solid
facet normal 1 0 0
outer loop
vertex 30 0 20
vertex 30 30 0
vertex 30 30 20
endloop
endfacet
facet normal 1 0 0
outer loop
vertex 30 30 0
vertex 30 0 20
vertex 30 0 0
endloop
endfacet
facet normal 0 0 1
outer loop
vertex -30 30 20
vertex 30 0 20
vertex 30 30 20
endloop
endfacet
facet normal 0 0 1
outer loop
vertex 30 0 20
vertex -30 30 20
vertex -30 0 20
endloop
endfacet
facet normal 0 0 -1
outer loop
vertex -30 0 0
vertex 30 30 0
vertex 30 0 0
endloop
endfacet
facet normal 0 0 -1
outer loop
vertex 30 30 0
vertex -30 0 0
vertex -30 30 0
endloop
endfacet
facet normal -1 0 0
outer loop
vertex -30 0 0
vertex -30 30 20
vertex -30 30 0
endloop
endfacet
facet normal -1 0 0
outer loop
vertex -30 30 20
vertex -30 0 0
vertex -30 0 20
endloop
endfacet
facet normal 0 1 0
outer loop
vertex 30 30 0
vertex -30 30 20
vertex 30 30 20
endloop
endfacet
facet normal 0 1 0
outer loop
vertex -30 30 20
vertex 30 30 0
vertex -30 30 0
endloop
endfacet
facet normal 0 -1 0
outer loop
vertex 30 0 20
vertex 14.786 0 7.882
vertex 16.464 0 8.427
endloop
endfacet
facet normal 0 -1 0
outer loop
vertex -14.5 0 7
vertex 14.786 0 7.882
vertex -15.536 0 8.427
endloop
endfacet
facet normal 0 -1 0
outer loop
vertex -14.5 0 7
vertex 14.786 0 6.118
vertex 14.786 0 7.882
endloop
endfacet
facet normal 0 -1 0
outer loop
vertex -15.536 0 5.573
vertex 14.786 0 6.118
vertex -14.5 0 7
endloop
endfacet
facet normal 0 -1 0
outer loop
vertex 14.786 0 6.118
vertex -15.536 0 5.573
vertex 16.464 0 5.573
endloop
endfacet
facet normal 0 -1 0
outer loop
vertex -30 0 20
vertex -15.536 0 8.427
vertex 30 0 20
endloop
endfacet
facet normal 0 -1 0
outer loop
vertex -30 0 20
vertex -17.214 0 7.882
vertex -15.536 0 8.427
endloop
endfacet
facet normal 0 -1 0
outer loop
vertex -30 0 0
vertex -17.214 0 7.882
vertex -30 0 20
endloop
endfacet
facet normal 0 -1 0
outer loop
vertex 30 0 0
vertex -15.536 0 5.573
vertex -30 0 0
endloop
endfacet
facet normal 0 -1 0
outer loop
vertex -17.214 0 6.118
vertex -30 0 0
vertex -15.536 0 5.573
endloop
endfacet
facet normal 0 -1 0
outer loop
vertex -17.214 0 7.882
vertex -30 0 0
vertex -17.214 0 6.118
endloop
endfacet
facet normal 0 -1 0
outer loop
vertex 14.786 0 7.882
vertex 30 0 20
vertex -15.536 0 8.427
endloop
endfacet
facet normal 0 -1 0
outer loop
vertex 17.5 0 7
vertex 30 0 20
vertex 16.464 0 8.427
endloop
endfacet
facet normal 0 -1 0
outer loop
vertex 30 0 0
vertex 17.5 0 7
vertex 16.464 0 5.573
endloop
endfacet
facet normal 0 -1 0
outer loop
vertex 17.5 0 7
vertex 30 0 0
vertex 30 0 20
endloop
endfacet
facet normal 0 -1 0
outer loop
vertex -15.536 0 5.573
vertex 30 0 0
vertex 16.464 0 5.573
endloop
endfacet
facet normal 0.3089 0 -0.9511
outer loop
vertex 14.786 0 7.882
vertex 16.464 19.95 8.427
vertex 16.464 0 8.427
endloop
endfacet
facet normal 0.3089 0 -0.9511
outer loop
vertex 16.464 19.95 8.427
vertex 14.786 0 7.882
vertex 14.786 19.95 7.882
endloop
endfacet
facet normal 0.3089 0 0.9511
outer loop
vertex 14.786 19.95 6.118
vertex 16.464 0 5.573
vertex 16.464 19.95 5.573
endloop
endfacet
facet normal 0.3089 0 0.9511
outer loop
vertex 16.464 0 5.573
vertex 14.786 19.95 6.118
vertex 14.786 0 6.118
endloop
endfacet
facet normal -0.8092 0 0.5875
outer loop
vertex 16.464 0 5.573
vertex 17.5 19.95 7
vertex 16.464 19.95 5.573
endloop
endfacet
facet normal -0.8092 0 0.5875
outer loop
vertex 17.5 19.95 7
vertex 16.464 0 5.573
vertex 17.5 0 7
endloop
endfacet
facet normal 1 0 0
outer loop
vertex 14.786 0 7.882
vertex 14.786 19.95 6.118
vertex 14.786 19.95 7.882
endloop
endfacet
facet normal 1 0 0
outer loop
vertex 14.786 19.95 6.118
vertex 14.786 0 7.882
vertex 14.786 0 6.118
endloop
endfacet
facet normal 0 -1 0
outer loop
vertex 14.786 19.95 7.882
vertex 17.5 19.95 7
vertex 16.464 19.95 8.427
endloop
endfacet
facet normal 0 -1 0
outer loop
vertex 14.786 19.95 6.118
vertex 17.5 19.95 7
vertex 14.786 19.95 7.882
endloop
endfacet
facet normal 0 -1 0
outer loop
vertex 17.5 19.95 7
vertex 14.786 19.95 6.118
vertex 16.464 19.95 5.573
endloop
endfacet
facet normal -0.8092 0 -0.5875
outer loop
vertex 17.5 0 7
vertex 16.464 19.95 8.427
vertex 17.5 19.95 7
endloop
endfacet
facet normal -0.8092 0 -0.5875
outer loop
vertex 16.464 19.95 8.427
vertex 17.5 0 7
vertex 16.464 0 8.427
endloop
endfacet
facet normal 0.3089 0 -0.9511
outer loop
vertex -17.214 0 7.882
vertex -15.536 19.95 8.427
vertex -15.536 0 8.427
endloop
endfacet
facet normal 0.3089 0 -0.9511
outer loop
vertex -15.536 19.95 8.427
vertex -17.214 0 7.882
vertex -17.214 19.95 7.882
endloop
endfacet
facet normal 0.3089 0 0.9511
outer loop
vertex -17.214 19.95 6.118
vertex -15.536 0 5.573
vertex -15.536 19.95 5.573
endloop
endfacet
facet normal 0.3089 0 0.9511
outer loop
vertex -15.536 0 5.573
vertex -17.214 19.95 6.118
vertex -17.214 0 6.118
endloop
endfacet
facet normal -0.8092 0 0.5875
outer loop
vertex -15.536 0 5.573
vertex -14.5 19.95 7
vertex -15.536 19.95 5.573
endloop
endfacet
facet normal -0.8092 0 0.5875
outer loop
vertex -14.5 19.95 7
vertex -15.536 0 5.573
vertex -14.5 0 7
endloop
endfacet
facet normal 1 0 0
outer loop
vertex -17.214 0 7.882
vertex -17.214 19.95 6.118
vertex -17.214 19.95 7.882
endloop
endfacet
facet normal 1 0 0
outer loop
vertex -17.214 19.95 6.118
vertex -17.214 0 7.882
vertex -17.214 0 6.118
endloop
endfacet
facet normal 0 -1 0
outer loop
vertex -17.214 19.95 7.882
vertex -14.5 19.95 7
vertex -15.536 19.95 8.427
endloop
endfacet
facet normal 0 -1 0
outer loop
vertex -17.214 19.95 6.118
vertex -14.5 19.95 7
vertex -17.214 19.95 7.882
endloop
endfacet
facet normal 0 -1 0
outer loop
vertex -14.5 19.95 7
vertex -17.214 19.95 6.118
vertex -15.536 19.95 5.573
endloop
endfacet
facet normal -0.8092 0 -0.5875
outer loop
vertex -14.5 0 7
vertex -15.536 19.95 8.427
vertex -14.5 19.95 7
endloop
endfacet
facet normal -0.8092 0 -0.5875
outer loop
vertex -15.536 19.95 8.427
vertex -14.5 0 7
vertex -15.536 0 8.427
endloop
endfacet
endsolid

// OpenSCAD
// Jitter, used to prevent coincident-surface problems. Should be less than layer-thickness.
j=0.05;

module XCarriage()
{
	c=32;
	d=3;

	color("Khaki")
	difference()
	{
		translate([0, 15, 10]) cube([60, 30, 20], center=true);
		translate([c/2, -j, 7]) rotate([-90, 0, 0]) cylinder(r=d/2, h=20);
		translate([-c/2, -j, 7]) rotate([-90, 0, 0]) cylinder(r=d/2, h=20);
	}
}


XCarriage();
